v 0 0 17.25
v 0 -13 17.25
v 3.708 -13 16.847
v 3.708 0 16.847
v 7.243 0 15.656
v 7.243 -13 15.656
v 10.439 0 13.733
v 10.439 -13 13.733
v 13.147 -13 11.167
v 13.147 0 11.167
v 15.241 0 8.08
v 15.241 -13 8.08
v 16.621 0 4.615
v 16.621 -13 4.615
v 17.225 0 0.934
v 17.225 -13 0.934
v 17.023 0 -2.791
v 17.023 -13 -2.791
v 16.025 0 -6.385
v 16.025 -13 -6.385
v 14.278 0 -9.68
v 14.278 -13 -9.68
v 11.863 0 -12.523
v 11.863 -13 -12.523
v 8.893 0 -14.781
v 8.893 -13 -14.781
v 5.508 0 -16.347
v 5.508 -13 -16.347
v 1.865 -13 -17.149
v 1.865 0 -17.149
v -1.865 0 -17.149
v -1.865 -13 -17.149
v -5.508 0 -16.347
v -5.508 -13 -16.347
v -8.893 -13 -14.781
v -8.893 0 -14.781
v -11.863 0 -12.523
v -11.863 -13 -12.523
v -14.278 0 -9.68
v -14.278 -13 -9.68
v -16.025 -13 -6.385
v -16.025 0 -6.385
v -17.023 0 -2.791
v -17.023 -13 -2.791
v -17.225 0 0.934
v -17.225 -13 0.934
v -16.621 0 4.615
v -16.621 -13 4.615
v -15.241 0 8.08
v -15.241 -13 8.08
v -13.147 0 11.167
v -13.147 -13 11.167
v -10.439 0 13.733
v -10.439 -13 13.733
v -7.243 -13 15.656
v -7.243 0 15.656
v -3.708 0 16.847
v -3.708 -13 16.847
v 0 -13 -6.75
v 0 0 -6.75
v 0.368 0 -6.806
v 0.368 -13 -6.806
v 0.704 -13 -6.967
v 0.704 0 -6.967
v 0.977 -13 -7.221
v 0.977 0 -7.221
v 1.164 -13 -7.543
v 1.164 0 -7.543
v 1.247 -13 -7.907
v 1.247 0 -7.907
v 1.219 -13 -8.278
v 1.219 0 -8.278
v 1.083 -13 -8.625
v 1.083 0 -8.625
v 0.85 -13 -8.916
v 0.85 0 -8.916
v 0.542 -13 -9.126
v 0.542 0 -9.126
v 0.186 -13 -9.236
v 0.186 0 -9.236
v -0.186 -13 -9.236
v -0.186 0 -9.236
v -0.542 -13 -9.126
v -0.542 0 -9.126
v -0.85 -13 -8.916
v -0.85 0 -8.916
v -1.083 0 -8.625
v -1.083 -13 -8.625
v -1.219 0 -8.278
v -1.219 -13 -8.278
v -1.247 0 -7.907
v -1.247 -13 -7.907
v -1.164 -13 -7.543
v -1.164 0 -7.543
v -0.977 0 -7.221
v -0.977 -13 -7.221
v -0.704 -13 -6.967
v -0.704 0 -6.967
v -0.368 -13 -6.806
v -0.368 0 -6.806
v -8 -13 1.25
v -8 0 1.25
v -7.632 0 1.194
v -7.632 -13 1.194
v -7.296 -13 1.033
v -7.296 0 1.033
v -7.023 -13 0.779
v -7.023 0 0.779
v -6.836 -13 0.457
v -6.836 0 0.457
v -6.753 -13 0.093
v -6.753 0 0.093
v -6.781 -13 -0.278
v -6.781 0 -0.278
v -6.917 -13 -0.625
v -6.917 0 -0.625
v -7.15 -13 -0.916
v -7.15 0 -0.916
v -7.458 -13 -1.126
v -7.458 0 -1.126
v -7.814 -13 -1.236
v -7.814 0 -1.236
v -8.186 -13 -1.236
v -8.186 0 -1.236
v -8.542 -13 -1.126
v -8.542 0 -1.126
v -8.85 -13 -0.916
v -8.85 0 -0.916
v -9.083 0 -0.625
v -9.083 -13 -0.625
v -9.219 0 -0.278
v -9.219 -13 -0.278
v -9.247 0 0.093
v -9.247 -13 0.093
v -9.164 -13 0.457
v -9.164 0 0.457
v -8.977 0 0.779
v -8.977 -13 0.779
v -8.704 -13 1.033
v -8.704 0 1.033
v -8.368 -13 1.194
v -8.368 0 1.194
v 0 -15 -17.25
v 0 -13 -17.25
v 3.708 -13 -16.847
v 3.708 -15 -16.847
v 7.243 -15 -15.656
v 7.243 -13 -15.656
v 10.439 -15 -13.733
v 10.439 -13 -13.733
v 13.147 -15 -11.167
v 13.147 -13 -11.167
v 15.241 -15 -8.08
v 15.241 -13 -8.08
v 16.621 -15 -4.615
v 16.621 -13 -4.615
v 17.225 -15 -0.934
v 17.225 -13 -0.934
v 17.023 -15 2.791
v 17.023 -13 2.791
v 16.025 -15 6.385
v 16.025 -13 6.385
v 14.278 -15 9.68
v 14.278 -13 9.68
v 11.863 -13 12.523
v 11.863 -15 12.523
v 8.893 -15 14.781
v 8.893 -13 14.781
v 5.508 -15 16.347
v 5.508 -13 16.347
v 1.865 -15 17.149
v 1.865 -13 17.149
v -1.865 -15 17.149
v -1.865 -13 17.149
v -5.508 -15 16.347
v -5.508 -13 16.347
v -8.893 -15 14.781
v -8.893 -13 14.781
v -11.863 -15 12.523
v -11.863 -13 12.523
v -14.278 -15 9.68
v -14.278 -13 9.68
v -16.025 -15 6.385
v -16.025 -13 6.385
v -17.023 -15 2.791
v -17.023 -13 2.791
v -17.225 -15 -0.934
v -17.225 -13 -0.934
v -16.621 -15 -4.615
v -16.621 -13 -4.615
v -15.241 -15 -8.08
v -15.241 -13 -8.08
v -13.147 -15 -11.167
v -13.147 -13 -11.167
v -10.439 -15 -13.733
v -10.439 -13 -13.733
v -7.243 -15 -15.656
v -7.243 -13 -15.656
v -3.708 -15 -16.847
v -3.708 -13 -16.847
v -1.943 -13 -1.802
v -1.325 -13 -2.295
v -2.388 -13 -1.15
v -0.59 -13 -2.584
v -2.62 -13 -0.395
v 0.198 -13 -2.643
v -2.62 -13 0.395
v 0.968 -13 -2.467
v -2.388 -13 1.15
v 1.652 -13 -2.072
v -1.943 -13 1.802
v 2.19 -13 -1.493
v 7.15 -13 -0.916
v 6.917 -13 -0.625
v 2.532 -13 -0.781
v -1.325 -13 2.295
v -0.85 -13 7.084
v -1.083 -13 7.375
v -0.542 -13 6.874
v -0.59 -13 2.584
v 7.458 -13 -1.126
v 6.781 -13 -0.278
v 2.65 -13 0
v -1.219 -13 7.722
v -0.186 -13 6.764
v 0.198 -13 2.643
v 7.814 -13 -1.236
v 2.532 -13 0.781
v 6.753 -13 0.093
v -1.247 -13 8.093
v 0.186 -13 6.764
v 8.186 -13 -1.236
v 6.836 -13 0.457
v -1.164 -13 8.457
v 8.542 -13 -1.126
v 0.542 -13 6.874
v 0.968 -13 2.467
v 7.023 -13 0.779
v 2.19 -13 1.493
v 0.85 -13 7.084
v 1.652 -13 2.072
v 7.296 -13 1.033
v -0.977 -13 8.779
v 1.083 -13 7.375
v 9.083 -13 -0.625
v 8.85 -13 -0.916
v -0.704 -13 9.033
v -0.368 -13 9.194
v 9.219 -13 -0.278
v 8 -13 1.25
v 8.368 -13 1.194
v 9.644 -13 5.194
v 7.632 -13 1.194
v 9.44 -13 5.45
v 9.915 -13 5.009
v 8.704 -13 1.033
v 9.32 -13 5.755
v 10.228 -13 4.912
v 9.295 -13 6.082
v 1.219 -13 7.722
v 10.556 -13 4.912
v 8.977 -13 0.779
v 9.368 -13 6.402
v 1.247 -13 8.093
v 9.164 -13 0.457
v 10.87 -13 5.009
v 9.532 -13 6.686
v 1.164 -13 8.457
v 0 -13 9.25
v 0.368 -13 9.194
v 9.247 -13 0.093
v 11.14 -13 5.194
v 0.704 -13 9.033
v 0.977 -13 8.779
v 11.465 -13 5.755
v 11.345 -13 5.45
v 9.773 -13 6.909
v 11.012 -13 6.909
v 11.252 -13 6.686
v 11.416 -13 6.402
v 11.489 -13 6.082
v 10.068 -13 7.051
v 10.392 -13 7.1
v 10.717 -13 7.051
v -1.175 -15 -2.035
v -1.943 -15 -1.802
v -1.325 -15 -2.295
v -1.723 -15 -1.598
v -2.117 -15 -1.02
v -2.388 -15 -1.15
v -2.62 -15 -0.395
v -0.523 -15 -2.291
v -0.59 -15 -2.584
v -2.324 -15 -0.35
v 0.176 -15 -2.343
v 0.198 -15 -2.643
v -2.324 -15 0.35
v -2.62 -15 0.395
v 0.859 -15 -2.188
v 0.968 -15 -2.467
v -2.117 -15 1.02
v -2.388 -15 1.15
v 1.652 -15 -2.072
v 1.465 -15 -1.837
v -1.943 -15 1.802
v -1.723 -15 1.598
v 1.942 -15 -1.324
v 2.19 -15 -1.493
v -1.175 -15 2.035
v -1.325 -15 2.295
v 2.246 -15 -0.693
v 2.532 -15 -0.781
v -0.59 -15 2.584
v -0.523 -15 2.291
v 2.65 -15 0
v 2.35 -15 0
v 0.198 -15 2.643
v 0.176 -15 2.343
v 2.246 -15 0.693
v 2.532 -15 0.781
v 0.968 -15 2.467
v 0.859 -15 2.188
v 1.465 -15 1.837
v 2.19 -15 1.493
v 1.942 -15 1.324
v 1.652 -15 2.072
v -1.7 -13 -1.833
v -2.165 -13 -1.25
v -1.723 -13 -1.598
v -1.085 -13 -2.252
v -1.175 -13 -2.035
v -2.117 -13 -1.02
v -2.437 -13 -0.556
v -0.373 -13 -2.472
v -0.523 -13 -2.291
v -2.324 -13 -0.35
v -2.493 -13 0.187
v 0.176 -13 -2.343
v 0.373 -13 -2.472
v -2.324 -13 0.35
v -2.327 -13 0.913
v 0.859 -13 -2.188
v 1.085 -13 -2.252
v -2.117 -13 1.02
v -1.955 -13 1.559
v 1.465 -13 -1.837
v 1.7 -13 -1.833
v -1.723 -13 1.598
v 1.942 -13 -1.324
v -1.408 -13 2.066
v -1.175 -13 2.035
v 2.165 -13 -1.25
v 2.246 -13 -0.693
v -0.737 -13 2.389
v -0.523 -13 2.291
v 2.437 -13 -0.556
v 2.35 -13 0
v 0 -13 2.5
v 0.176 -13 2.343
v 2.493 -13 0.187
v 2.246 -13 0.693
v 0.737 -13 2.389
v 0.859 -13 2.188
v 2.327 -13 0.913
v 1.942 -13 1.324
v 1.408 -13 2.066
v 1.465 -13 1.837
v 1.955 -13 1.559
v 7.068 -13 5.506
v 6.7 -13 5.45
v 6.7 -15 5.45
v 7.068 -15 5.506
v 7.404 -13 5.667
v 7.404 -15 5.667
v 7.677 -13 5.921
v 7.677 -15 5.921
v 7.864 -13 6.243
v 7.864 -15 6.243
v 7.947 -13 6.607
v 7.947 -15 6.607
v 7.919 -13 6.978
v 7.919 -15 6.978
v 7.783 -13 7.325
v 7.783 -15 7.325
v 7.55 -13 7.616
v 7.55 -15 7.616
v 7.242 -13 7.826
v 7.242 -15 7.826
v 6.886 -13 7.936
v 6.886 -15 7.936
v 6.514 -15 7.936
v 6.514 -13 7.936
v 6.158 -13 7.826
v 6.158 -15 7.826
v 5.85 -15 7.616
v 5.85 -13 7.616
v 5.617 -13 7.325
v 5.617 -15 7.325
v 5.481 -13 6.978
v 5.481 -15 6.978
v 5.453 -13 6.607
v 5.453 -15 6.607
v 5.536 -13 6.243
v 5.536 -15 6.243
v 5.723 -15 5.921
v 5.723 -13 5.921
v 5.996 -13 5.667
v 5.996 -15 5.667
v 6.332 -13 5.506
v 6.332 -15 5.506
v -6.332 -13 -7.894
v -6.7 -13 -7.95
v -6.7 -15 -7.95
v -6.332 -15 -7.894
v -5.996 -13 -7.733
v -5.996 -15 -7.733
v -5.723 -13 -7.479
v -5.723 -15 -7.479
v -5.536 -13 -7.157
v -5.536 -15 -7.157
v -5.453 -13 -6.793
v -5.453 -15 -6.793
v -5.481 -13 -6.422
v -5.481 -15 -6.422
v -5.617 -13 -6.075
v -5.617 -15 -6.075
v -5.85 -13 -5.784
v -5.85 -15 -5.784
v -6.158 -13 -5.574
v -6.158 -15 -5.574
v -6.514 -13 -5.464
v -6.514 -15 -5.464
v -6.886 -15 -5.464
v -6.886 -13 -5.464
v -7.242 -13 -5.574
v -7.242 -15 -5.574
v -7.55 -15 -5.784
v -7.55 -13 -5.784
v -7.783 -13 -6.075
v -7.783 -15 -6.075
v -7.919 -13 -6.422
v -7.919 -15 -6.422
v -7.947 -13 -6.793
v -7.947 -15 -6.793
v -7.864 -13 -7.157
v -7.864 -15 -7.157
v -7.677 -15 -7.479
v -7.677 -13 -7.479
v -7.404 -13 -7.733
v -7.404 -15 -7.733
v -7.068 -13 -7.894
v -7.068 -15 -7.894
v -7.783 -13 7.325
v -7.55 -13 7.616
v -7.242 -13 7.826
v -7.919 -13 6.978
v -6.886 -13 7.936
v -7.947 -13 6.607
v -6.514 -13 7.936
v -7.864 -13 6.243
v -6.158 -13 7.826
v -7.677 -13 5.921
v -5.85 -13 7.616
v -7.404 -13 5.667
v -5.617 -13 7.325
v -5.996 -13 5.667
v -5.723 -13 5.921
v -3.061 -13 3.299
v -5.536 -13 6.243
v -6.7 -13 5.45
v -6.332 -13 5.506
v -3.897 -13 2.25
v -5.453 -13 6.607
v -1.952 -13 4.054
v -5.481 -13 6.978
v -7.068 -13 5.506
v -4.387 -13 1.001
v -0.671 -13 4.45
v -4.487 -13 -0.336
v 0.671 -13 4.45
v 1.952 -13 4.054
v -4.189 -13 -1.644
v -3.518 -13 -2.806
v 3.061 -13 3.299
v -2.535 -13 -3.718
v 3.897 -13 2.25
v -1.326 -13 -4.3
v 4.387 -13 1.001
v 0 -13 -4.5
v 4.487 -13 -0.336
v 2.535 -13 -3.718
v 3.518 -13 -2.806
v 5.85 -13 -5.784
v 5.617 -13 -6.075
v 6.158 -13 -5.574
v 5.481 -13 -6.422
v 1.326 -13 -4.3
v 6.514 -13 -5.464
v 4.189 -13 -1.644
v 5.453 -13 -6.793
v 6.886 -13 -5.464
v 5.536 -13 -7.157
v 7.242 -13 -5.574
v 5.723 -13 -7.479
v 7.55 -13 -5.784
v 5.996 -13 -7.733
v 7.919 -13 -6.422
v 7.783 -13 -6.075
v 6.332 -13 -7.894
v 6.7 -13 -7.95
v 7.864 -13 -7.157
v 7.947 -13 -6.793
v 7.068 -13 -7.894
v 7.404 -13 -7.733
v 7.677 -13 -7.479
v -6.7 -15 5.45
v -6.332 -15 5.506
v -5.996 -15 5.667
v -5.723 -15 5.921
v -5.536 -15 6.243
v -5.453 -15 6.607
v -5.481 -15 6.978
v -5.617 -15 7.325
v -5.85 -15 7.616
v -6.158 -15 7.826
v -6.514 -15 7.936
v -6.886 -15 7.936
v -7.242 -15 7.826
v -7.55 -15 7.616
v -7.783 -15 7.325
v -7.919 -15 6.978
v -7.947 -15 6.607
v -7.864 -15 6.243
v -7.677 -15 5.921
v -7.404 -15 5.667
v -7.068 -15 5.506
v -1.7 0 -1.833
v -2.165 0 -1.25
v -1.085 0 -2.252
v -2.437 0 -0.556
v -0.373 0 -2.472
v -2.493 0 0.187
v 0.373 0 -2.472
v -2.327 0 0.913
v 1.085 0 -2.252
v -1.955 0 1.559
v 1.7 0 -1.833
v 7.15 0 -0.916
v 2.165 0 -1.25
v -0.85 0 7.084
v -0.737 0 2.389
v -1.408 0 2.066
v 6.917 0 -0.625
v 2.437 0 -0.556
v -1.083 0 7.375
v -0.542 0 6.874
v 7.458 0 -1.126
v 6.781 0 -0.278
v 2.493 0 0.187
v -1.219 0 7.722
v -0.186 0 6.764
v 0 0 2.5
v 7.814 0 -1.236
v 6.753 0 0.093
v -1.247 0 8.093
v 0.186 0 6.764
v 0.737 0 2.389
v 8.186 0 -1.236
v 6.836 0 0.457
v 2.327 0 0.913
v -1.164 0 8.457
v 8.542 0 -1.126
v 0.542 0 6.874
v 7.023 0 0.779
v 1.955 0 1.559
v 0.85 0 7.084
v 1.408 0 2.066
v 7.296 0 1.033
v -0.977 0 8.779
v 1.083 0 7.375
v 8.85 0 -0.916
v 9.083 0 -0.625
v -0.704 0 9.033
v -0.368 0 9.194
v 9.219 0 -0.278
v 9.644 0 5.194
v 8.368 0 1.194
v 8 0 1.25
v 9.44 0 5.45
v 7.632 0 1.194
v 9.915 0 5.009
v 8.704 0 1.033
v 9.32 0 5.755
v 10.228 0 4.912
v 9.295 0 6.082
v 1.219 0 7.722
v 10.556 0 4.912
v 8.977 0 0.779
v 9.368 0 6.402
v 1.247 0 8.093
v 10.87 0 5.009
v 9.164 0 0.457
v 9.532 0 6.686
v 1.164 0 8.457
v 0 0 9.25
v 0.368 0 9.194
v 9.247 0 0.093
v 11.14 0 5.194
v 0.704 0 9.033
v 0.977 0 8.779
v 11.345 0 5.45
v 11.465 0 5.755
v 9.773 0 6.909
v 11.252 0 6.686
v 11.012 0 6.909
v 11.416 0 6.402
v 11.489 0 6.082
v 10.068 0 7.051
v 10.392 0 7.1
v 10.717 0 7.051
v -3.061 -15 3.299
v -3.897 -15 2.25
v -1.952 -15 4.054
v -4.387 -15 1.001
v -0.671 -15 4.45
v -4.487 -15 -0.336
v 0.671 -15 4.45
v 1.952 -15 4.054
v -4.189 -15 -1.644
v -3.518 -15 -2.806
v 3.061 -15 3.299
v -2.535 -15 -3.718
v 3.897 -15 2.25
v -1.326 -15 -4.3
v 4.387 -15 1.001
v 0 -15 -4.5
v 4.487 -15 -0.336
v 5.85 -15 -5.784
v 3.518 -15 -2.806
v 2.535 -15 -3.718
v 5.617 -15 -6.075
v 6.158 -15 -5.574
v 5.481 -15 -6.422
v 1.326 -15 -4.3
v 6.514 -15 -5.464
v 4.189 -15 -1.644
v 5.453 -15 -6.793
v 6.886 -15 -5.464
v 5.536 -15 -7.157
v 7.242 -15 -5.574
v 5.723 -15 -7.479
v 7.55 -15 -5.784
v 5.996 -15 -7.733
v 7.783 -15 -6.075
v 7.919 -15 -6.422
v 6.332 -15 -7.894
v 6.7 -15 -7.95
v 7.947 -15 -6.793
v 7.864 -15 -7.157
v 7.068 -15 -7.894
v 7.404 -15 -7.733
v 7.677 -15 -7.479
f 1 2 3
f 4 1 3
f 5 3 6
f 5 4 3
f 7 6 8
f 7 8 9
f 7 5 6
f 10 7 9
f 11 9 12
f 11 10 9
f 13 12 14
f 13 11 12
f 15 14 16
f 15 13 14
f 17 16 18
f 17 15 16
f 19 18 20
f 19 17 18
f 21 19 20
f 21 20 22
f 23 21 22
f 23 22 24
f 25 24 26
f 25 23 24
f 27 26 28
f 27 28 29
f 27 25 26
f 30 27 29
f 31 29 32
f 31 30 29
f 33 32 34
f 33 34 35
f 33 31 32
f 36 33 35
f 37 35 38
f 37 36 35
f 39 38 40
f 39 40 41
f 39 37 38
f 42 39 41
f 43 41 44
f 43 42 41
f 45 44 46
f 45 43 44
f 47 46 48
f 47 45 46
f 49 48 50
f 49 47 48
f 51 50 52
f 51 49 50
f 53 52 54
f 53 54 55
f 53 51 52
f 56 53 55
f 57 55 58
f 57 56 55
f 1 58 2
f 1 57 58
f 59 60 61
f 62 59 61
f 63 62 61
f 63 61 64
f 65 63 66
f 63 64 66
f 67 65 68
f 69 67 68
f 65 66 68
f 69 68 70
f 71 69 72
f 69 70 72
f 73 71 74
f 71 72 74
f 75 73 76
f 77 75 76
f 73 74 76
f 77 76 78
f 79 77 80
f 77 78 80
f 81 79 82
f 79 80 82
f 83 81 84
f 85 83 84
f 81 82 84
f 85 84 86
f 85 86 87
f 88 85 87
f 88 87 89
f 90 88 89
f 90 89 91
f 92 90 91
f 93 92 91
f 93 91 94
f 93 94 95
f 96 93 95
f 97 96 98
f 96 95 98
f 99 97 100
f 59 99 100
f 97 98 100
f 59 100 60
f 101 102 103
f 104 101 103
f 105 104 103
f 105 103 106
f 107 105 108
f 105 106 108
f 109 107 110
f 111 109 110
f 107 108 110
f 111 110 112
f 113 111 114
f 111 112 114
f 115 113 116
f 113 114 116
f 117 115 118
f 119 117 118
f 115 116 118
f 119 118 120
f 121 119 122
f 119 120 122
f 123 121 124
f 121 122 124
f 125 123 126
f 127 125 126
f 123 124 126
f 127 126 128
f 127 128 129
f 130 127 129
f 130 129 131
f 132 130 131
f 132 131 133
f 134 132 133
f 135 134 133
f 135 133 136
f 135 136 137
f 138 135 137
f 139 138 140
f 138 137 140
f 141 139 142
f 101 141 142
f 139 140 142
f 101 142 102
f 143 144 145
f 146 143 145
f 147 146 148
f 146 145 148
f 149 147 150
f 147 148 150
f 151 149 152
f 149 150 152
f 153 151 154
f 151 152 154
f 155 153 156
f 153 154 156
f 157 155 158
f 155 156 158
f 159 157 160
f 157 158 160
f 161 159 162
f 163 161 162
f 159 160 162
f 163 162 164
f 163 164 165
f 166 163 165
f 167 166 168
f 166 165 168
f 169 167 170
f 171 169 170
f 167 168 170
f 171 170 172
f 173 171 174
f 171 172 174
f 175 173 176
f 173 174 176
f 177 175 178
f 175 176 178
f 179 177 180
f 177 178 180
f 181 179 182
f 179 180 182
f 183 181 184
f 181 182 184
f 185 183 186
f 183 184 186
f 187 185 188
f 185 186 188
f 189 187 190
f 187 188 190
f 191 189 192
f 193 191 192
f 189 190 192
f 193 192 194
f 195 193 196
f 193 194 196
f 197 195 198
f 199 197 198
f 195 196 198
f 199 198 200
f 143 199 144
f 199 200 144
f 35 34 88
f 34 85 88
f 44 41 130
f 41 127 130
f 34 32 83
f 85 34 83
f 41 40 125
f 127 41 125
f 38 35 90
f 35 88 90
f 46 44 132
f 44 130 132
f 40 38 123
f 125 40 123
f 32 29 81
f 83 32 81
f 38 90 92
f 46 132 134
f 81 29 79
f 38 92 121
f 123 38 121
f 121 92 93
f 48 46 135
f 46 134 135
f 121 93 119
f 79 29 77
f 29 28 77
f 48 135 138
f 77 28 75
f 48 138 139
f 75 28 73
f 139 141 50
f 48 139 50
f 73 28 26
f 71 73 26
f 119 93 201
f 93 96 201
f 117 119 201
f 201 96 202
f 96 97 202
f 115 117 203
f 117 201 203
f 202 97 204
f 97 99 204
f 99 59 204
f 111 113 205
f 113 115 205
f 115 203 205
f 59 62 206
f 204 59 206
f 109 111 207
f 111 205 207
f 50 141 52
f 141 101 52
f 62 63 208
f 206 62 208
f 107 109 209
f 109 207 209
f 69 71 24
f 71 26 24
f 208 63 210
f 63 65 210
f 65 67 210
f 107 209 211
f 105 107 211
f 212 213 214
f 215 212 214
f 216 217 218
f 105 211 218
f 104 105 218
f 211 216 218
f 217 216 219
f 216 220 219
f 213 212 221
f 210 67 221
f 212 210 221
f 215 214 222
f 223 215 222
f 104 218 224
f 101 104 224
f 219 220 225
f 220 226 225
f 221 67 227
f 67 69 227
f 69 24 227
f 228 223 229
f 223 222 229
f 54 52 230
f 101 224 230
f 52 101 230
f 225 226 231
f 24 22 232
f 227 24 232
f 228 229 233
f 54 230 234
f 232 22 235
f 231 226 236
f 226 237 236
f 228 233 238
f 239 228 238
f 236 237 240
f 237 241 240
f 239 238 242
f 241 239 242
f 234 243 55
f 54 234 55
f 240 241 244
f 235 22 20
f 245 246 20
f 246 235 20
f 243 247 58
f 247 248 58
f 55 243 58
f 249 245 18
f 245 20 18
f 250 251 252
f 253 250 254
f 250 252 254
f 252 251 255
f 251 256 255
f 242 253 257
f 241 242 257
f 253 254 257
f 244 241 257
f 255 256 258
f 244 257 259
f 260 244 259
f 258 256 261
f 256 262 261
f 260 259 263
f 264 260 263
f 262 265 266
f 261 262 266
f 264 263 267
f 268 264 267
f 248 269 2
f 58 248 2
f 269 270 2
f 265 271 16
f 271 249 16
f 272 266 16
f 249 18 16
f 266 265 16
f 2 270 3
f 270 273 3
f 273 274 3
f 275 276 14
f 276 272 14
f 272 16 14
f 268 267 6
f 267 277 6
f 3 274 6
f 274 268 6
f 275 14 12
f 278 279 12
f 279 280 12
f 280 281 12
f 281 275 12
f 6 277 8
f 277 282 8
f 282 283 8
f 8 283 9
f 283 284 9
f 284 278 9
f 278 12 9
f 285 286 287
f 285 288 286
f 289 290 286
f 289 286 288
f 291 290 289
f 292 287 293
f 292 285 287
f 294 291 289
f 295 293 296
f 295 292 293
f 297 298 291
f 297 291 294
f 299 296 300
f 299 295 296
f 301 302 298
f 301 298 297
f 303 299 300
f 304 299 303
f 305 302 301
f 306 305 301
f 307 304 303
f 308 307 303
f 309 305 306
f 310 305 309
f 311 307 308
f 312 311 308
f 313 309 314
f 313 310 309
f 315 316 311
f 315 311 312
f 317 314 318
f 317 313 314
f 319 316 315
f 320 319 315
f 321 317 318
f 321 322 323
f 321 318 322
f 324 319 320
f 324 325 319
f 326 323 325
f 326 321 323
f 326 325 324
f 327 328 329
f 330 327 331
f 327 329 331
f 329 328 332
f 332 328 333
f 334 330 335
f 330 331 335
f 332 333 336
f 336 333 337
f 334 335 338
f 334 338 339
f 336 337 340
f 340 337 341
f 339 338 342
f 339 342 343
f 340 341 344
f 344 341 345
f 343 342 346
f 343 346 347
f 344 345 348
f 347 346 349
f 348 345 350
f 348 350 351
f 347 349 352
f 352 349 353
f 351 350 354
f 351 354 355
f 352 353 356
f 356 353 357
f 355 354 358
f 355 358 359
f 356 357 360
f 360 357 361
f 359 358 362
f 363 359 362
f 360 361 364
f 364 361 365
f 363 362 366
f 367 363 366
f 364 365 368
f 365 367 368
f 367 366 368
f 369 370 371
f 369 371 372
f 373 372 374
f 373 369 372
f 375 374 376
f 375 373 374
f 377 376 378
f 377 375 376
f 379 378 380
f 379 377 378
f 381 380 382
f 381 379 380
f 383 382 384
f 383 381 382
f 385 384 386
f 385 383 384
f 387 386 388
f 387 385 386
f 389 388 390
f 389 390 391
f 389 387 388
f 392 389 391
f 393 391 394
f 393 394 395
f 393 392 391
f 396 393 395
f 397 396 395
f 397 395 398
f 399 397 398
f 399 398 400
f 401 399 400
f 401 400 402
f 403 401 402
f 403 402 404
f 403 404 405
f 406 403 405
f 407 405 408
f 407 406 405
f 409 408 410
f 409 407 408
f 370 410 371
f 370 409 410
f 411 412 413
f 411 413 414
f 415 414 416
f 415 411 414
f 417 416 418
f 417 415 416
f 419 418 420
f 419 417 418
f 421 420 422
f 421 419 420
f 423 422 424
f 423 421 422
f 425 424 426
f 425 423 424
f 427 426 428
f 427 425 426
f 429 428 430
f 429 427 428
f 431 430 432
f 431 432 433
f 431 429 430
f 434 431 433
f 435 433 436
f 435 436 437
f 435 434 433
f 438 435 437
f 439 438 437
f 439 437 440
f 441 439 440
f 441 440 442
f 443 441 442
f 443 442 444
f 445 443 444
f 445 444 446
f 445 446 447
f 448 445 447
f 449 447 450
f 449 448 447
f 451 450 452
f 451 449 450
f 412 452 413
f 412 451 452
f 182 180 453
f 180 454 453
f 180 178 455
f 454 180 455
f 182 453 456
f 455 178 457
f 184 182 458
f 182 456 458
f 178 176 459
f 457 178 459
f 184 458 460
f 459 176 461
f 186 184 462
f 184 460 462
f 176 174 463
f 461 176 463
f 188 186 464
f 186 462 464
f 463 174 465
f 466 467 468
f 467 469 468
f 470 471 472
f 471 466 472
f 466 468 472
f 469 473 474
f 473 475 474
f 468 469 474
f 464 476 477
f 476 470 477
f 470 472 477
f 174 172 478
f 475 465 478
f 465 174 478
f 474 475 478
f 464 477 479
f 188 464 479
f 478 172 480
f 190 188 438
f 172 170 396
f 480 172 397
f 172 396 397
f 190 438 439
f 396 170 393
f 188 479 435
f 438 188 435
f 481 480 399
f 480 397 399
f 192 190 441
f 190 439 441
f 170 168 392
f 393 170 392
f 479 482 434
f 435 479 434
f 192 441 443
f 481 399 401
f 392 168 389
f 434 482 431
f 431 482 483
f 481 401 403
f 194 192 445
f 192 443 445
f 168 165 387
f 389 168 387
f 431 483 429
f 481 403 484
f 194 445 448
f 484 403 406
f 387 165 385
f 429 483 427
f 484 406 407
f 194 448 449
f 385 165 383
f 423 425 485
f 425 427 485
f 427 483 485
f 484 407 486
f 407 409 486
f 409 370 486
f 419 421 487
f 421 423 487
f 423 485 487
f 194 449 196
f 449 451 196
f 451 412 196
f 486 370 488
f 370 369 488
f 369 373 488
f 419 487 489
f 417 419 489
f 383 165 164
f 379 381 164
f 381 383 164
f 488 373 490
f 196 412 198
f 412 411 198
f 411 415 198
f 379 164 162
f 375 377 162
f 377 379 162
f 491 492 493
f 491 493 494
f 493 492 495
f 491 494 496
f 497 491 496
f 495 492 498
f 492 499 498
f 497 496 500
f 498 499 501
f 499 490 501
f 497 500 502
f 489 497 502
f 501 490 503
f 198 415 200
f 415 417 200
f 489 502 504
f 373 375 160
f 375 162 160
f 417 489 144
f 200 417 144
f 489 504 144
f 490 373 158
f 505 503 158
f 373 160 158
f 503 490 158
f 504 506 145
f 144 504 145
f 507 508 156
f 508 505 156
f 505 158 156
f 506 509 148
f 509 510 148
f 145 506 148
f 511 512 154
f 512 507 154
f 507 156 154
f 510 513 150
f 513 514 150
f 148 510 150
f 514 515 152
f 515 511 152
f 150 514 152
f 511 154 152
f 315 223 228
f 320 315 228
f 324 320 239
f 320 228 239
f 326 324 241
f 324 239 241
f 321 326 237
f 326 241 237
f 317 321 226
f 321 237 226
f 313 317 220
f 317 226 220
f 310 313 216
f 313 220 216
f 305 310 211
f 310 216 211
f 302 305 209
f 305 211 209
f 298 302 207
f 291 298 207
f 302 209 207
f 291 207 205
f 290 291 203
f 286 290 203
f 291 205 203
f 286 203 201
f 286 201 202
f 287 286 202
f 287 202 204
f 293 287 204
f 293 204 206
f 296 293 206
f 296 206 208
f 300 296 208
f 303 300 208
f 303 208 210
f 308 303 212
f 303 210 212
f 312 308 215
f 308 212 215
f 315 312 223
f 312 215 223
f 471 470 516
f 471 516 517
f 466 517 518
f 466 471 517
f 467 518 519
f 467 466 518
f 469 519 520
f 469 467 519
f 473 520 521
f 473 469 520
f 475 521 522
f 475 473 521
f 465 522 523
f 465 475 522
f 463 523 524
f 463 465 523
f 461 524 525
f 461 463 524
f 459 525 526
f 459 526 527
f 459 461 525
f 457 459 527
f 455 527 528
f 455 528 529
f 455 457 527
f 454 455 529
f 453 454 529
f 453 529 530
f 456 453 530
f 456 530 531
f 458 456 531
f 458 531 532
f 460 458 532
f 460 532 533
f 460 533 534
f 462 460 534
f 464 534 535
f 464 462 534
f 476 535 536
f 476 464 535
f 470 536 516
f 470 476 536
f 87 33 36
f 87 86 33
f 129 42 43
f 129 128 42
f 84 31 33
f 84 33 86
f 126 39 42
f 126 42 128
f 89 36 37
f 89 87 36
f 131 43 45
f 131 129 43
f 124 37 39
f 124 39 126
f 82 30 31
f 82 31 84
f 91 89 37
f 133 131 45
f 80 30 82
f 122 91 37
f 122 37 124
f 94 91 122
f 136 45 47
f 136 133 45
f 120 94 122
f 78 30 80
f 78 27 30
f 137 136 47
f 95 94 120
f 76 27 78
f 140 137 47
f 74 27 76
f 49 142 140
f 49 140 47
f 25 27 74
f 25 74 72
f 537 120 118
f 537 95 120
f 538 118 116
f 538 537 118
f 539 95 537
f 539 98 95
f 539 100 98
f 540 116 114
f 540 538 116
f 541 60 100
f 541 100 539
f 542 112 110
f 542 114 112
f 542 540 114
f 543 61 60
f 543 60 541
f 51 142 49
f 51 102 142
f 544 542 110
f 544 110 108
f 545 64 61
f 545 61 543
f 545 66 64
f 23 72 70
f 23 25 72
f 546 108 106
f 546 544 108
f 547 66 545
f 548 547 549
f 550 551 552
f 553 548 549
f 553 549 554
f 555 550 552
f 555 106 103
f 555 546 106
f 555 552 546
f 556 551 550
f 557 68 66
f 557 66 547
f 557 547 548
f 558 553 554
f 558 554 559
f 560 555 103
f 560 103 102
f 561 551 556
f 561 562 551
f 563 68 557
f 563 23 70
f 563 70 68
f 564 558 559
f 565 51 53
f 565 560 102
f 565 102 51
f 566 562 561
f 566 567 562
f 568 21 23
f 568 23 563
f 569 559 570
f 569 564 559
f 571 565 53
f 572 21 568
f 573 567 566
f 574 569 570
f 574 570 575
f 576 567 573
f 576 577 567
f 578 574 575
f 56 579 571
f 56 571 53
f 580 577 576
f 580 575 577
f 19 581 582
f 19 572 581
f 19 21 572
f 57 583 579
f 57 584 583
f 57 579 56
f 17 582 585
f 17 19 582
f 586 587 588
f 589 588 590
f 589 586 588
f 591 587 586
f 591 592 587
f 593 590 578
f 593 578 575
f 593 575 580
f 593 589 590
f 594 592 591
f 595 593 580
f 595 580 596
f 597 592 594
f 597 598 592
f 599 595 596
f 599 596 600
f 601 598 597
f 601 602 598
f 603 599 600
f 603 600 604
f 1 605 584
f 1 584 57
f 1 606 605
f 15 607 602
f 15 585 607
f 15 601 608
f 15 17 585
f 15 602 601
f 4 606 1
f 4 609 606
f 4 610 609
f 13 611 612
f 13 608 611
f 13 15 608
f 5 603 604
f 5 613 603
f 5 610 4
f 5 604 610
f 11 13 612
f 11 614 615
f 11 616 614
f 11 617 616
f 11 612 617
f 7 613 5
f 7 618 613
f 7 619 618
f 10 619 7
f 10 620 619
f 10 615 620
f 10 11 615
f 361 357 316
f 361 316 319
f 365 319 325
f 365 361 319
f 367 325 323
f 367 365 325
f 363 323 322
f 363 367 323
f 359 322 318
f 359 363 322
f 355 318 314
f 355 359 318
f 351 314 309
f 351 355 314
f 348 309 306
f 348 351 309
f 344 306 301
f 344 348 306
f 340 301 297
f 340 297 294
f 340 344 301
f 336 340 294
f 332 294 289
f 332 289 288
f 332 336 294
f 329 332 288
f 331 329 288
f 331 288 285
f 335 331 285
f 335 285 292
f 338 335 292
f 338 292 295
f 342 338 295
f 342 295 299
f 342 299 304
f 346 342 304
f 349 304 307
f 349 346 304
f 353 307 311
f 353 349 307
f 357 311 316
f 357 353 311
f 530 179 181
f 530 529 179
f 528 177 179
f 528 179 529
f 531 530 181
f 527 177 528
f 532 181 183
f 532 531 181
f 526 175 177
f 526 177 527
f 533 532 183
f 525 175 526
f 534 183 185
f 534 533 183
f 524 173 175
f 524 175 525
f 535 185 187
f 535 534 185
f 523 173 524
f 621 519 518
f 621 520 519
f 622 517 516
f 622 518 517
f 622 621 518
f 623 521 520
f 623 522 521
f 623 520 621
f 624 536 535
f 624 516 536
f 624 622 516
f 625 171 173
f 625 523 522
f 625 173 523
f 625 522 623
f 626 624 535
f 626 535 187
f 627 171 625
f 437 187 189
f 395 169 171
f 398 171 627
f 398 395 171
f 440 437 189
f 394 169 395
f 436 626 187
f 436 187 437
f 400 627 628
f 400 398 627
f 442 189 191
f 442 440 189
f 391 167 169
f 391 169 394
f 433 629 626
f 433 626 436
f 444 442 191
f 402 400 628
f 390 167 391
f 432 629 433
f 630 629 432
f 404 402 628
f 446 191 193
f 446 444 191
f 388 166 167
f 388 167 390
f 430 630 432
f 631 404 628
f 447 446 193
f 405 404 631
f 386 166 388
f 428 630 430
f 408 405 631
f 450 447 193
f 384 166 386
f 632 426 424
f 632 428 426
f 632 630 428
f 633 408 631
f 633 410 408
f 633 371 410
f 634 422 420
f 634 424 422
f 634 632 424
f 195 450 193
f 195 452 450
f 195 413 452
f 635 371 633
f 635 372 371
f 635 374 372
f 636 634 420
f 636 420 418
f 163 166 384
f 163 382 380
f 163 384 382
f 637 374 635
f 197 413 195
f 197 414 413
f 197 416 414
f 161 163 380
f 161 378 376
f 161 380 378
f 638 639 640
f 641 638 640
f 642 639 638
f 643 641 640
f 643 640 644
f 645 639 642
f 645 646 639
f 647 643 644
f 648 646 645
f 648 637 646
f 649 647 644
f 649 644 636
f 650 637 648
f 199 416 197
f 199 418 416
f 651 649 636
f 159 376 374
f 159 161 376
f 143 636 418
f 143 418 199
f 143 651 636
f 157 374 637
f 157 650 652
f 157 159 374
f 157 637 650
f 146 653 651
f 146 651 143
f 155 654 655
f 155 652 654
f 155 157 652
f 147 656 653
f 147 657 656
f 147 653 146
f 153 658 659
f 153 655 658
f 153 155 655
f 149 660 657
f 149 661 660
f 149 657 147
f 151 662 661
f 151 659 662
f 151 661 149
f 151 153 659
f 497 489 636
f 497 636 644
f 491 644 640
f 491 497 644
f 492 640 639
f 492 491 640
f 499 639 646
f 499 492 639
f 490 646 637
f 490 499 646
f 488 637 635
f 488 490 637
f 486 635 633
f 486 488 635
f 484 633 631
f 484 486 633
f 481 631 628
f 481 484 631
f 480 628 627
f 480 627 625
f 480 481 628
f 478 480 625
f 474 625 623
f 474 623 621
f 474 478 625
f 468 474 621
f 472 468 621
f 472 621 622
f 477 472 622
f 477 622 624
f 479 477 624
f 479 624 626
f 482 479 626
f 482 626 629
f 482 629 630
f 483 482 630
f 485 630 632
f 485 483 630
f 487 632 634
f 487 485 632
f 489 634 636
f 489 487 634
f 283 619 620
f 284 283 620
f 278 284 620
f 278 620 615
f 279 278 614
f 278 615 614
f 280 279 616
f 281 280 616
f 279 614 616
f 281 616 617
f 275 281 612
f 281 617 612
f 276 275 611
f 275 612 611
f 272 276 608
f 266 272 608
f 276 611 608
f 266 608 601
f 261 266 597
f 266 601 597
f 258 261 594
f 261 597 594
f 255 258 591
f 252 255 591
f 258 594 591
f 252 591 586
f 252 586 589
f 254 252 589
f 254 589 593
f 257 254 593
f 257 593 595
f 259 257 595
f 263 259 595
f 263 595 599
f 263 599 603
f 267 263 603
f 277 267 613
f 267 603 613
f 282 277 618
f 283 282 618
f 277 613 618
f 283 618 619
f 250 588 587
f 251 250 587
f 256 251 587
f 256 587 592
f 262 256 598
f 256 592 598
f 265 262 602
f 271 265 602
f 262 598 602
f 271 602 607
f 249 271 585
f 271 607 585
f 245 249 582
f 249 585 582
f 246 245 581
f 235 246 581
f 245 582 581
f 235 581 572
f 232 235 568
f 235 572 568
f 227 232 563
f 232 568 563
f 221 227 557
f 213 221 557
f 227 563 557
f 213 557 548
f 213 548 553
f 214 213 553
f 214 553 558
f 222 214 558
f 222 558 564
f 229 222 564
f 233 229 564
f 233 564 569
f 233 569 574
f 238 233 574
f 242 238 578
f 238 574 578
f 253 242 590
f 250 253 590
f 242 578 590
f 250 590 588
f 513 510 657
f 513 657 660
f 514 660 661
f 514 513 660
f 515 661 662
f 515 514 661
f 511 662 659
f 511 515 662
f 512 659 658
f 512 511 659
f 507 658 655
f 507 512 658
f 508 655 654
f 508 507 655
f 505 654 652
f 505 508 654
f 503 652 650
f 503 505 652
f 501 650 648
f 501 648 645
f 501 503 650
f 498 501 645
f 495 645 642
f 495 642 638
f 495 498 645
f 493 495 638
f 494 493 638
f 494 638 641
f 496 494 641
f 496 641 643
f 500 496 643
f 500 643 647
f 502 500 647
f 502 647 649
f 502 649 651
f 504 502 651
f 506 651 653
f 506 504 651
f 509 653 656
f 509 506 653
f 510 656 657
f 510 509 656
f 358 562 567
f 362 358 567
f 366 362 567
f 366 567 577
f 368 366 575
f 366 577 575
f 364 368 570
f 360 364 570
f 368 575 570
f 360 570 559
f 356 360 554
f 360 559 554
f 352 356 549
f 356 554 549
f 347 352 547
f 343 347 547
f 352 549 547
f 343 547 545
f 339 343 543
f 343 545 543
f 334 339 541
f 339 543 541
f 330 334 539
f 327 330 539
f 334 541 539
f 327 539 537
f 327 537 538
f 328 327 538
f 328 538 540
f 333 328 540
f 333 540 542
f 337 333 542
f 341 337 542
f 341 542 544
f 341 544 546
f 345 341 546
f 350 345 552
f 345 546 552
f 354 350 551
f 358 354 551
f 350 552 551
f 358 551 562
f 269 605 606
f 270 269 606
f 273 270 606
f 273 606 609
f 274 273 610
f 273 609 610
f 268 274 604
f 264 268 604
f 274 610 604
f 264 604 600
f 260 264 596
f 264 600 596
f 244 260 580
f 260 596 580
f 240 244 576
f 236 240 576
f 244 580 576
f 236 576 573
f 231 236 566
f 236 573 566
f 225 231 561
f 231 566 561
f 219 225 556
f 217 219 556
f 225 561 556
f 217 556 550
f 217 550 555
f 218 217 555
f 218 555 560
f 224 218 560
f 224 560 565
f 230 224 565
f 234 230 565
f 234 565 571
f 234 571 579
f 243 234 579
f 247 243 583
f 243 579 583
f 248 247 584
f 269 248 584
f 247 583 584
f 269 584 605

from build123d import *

# Parameters (mm, degrees)
SKETCH_1_R        = 17.25
SKETCH_1_R_2      = 2.5
SKETCH_1_R_3      = 1.25
SKETCH_1_R_4      = 1.1
EXTRUDE_1_DEPTH   = 13
SKETCH_2_R        = 17.25
SKETCH_2_R_2      = 1.25
SKETCH_2_R_3      = 4.5
EXTRUDE_3_DEPTH   = 2
SKETCH_3_R        = 2.65
SKETCH_3_R_2      = 2.35
EXTRUDE_1_2_DEPTH = 2


with BuildPart() as part:
    # 草图1 → Extrude 1 (new body)
    with BuildSketch(Plane(origin=(0, 0, 0), x_dir=(1, 0, 0), z_dir=(0, 1, 0))):
        with Locations(Location((0, 0, 0), (0, 0, 270))):
            Circle(SKETCH_1_R)
        with Locations(Location((0, 0, 0), (0, 0, 270))):
            Circle(SKETCH_1_R_2, mode=Mode.SUBTRACT)
        with Locations(Location((8, 0, 0), (0, 0, 270))):
            Circle(SKETCH_1_R_3, mode=Mode.SUBTRACT)
        with Locations(Location((0, -8, 0), (0, 0, 270))):
            Circle(SKETCH_1_R_3, mode=Mode.SUBTRACT)
        with Locations(Location((-8, 0, 0), (0, 0, 270))):
            Circle(SKETCH_1_R_3, mode=Mode.SUBTRACT)
        with Locations(Location((0, 8, 0), (0, 0, 270))):
            Circle(SKETCH_1_R_3, mode=Mode.SUBTRACT)
        with Locations(Location((10.392304845, -6, 0), (0, 0, 270))):
            Circle(SKETCH_1_R_4, mode=Mode.SUBTRACT)
    extrude(amount=-EXTRUDE_1_DEPTH)

    # 草图3 → Extrude 1 2 (add)
    with BuildSketch(Plane.XZ.offset(13)):
        Circle(SKETCH_3_R)
        Circle(SKETCH_3_R_2, mode=Mode.SUBTRACT)
    extrude(amount=EXTRUDE_1_2_DEPTH)


with BuildPart() as body_2:
    # 草图2 → 凸台-拉伸3 (new body)
    with BuildSketch(Plane.XZ.offset(13)):
        with Locations(Location((0, 0, 0), (0, 0, 270))):
            Circle(SKETCH_2_R)
        with Locations(Location((6.7, 6.7, 0), (0, 0, 270))):
            Circle(SKETCH_2_R_2, mode=Mode.SUBTRACT)
        with Locations(Location((6.7, -6.7, 0), (0, 0, 270))):
            Circle(SKETCH_2_R_2, mode=Mode.SUBTRACT)
        with Locations(Location((-6.7, -6.7, 0), (0, 0, 270))):
            Circle(SKETCH_2_R_2, mode=Mode.SUBTRACT)
        with Locations(Location((-6.7, 6.7, 0), (0, 0, 270))):
            Circle(SKETCH_2_R_2, mode=Mode.SUBTRACT)
        with Locations(Location((0, 0, 0), (0, 0, 270))):
            Circle(SKETCH_2_R_3, mode=Mode.SUBTRACT)
    extrude(amount=EXTRUDE_3_DEPTH)


solid = Compound([part.part, body_2.part])
